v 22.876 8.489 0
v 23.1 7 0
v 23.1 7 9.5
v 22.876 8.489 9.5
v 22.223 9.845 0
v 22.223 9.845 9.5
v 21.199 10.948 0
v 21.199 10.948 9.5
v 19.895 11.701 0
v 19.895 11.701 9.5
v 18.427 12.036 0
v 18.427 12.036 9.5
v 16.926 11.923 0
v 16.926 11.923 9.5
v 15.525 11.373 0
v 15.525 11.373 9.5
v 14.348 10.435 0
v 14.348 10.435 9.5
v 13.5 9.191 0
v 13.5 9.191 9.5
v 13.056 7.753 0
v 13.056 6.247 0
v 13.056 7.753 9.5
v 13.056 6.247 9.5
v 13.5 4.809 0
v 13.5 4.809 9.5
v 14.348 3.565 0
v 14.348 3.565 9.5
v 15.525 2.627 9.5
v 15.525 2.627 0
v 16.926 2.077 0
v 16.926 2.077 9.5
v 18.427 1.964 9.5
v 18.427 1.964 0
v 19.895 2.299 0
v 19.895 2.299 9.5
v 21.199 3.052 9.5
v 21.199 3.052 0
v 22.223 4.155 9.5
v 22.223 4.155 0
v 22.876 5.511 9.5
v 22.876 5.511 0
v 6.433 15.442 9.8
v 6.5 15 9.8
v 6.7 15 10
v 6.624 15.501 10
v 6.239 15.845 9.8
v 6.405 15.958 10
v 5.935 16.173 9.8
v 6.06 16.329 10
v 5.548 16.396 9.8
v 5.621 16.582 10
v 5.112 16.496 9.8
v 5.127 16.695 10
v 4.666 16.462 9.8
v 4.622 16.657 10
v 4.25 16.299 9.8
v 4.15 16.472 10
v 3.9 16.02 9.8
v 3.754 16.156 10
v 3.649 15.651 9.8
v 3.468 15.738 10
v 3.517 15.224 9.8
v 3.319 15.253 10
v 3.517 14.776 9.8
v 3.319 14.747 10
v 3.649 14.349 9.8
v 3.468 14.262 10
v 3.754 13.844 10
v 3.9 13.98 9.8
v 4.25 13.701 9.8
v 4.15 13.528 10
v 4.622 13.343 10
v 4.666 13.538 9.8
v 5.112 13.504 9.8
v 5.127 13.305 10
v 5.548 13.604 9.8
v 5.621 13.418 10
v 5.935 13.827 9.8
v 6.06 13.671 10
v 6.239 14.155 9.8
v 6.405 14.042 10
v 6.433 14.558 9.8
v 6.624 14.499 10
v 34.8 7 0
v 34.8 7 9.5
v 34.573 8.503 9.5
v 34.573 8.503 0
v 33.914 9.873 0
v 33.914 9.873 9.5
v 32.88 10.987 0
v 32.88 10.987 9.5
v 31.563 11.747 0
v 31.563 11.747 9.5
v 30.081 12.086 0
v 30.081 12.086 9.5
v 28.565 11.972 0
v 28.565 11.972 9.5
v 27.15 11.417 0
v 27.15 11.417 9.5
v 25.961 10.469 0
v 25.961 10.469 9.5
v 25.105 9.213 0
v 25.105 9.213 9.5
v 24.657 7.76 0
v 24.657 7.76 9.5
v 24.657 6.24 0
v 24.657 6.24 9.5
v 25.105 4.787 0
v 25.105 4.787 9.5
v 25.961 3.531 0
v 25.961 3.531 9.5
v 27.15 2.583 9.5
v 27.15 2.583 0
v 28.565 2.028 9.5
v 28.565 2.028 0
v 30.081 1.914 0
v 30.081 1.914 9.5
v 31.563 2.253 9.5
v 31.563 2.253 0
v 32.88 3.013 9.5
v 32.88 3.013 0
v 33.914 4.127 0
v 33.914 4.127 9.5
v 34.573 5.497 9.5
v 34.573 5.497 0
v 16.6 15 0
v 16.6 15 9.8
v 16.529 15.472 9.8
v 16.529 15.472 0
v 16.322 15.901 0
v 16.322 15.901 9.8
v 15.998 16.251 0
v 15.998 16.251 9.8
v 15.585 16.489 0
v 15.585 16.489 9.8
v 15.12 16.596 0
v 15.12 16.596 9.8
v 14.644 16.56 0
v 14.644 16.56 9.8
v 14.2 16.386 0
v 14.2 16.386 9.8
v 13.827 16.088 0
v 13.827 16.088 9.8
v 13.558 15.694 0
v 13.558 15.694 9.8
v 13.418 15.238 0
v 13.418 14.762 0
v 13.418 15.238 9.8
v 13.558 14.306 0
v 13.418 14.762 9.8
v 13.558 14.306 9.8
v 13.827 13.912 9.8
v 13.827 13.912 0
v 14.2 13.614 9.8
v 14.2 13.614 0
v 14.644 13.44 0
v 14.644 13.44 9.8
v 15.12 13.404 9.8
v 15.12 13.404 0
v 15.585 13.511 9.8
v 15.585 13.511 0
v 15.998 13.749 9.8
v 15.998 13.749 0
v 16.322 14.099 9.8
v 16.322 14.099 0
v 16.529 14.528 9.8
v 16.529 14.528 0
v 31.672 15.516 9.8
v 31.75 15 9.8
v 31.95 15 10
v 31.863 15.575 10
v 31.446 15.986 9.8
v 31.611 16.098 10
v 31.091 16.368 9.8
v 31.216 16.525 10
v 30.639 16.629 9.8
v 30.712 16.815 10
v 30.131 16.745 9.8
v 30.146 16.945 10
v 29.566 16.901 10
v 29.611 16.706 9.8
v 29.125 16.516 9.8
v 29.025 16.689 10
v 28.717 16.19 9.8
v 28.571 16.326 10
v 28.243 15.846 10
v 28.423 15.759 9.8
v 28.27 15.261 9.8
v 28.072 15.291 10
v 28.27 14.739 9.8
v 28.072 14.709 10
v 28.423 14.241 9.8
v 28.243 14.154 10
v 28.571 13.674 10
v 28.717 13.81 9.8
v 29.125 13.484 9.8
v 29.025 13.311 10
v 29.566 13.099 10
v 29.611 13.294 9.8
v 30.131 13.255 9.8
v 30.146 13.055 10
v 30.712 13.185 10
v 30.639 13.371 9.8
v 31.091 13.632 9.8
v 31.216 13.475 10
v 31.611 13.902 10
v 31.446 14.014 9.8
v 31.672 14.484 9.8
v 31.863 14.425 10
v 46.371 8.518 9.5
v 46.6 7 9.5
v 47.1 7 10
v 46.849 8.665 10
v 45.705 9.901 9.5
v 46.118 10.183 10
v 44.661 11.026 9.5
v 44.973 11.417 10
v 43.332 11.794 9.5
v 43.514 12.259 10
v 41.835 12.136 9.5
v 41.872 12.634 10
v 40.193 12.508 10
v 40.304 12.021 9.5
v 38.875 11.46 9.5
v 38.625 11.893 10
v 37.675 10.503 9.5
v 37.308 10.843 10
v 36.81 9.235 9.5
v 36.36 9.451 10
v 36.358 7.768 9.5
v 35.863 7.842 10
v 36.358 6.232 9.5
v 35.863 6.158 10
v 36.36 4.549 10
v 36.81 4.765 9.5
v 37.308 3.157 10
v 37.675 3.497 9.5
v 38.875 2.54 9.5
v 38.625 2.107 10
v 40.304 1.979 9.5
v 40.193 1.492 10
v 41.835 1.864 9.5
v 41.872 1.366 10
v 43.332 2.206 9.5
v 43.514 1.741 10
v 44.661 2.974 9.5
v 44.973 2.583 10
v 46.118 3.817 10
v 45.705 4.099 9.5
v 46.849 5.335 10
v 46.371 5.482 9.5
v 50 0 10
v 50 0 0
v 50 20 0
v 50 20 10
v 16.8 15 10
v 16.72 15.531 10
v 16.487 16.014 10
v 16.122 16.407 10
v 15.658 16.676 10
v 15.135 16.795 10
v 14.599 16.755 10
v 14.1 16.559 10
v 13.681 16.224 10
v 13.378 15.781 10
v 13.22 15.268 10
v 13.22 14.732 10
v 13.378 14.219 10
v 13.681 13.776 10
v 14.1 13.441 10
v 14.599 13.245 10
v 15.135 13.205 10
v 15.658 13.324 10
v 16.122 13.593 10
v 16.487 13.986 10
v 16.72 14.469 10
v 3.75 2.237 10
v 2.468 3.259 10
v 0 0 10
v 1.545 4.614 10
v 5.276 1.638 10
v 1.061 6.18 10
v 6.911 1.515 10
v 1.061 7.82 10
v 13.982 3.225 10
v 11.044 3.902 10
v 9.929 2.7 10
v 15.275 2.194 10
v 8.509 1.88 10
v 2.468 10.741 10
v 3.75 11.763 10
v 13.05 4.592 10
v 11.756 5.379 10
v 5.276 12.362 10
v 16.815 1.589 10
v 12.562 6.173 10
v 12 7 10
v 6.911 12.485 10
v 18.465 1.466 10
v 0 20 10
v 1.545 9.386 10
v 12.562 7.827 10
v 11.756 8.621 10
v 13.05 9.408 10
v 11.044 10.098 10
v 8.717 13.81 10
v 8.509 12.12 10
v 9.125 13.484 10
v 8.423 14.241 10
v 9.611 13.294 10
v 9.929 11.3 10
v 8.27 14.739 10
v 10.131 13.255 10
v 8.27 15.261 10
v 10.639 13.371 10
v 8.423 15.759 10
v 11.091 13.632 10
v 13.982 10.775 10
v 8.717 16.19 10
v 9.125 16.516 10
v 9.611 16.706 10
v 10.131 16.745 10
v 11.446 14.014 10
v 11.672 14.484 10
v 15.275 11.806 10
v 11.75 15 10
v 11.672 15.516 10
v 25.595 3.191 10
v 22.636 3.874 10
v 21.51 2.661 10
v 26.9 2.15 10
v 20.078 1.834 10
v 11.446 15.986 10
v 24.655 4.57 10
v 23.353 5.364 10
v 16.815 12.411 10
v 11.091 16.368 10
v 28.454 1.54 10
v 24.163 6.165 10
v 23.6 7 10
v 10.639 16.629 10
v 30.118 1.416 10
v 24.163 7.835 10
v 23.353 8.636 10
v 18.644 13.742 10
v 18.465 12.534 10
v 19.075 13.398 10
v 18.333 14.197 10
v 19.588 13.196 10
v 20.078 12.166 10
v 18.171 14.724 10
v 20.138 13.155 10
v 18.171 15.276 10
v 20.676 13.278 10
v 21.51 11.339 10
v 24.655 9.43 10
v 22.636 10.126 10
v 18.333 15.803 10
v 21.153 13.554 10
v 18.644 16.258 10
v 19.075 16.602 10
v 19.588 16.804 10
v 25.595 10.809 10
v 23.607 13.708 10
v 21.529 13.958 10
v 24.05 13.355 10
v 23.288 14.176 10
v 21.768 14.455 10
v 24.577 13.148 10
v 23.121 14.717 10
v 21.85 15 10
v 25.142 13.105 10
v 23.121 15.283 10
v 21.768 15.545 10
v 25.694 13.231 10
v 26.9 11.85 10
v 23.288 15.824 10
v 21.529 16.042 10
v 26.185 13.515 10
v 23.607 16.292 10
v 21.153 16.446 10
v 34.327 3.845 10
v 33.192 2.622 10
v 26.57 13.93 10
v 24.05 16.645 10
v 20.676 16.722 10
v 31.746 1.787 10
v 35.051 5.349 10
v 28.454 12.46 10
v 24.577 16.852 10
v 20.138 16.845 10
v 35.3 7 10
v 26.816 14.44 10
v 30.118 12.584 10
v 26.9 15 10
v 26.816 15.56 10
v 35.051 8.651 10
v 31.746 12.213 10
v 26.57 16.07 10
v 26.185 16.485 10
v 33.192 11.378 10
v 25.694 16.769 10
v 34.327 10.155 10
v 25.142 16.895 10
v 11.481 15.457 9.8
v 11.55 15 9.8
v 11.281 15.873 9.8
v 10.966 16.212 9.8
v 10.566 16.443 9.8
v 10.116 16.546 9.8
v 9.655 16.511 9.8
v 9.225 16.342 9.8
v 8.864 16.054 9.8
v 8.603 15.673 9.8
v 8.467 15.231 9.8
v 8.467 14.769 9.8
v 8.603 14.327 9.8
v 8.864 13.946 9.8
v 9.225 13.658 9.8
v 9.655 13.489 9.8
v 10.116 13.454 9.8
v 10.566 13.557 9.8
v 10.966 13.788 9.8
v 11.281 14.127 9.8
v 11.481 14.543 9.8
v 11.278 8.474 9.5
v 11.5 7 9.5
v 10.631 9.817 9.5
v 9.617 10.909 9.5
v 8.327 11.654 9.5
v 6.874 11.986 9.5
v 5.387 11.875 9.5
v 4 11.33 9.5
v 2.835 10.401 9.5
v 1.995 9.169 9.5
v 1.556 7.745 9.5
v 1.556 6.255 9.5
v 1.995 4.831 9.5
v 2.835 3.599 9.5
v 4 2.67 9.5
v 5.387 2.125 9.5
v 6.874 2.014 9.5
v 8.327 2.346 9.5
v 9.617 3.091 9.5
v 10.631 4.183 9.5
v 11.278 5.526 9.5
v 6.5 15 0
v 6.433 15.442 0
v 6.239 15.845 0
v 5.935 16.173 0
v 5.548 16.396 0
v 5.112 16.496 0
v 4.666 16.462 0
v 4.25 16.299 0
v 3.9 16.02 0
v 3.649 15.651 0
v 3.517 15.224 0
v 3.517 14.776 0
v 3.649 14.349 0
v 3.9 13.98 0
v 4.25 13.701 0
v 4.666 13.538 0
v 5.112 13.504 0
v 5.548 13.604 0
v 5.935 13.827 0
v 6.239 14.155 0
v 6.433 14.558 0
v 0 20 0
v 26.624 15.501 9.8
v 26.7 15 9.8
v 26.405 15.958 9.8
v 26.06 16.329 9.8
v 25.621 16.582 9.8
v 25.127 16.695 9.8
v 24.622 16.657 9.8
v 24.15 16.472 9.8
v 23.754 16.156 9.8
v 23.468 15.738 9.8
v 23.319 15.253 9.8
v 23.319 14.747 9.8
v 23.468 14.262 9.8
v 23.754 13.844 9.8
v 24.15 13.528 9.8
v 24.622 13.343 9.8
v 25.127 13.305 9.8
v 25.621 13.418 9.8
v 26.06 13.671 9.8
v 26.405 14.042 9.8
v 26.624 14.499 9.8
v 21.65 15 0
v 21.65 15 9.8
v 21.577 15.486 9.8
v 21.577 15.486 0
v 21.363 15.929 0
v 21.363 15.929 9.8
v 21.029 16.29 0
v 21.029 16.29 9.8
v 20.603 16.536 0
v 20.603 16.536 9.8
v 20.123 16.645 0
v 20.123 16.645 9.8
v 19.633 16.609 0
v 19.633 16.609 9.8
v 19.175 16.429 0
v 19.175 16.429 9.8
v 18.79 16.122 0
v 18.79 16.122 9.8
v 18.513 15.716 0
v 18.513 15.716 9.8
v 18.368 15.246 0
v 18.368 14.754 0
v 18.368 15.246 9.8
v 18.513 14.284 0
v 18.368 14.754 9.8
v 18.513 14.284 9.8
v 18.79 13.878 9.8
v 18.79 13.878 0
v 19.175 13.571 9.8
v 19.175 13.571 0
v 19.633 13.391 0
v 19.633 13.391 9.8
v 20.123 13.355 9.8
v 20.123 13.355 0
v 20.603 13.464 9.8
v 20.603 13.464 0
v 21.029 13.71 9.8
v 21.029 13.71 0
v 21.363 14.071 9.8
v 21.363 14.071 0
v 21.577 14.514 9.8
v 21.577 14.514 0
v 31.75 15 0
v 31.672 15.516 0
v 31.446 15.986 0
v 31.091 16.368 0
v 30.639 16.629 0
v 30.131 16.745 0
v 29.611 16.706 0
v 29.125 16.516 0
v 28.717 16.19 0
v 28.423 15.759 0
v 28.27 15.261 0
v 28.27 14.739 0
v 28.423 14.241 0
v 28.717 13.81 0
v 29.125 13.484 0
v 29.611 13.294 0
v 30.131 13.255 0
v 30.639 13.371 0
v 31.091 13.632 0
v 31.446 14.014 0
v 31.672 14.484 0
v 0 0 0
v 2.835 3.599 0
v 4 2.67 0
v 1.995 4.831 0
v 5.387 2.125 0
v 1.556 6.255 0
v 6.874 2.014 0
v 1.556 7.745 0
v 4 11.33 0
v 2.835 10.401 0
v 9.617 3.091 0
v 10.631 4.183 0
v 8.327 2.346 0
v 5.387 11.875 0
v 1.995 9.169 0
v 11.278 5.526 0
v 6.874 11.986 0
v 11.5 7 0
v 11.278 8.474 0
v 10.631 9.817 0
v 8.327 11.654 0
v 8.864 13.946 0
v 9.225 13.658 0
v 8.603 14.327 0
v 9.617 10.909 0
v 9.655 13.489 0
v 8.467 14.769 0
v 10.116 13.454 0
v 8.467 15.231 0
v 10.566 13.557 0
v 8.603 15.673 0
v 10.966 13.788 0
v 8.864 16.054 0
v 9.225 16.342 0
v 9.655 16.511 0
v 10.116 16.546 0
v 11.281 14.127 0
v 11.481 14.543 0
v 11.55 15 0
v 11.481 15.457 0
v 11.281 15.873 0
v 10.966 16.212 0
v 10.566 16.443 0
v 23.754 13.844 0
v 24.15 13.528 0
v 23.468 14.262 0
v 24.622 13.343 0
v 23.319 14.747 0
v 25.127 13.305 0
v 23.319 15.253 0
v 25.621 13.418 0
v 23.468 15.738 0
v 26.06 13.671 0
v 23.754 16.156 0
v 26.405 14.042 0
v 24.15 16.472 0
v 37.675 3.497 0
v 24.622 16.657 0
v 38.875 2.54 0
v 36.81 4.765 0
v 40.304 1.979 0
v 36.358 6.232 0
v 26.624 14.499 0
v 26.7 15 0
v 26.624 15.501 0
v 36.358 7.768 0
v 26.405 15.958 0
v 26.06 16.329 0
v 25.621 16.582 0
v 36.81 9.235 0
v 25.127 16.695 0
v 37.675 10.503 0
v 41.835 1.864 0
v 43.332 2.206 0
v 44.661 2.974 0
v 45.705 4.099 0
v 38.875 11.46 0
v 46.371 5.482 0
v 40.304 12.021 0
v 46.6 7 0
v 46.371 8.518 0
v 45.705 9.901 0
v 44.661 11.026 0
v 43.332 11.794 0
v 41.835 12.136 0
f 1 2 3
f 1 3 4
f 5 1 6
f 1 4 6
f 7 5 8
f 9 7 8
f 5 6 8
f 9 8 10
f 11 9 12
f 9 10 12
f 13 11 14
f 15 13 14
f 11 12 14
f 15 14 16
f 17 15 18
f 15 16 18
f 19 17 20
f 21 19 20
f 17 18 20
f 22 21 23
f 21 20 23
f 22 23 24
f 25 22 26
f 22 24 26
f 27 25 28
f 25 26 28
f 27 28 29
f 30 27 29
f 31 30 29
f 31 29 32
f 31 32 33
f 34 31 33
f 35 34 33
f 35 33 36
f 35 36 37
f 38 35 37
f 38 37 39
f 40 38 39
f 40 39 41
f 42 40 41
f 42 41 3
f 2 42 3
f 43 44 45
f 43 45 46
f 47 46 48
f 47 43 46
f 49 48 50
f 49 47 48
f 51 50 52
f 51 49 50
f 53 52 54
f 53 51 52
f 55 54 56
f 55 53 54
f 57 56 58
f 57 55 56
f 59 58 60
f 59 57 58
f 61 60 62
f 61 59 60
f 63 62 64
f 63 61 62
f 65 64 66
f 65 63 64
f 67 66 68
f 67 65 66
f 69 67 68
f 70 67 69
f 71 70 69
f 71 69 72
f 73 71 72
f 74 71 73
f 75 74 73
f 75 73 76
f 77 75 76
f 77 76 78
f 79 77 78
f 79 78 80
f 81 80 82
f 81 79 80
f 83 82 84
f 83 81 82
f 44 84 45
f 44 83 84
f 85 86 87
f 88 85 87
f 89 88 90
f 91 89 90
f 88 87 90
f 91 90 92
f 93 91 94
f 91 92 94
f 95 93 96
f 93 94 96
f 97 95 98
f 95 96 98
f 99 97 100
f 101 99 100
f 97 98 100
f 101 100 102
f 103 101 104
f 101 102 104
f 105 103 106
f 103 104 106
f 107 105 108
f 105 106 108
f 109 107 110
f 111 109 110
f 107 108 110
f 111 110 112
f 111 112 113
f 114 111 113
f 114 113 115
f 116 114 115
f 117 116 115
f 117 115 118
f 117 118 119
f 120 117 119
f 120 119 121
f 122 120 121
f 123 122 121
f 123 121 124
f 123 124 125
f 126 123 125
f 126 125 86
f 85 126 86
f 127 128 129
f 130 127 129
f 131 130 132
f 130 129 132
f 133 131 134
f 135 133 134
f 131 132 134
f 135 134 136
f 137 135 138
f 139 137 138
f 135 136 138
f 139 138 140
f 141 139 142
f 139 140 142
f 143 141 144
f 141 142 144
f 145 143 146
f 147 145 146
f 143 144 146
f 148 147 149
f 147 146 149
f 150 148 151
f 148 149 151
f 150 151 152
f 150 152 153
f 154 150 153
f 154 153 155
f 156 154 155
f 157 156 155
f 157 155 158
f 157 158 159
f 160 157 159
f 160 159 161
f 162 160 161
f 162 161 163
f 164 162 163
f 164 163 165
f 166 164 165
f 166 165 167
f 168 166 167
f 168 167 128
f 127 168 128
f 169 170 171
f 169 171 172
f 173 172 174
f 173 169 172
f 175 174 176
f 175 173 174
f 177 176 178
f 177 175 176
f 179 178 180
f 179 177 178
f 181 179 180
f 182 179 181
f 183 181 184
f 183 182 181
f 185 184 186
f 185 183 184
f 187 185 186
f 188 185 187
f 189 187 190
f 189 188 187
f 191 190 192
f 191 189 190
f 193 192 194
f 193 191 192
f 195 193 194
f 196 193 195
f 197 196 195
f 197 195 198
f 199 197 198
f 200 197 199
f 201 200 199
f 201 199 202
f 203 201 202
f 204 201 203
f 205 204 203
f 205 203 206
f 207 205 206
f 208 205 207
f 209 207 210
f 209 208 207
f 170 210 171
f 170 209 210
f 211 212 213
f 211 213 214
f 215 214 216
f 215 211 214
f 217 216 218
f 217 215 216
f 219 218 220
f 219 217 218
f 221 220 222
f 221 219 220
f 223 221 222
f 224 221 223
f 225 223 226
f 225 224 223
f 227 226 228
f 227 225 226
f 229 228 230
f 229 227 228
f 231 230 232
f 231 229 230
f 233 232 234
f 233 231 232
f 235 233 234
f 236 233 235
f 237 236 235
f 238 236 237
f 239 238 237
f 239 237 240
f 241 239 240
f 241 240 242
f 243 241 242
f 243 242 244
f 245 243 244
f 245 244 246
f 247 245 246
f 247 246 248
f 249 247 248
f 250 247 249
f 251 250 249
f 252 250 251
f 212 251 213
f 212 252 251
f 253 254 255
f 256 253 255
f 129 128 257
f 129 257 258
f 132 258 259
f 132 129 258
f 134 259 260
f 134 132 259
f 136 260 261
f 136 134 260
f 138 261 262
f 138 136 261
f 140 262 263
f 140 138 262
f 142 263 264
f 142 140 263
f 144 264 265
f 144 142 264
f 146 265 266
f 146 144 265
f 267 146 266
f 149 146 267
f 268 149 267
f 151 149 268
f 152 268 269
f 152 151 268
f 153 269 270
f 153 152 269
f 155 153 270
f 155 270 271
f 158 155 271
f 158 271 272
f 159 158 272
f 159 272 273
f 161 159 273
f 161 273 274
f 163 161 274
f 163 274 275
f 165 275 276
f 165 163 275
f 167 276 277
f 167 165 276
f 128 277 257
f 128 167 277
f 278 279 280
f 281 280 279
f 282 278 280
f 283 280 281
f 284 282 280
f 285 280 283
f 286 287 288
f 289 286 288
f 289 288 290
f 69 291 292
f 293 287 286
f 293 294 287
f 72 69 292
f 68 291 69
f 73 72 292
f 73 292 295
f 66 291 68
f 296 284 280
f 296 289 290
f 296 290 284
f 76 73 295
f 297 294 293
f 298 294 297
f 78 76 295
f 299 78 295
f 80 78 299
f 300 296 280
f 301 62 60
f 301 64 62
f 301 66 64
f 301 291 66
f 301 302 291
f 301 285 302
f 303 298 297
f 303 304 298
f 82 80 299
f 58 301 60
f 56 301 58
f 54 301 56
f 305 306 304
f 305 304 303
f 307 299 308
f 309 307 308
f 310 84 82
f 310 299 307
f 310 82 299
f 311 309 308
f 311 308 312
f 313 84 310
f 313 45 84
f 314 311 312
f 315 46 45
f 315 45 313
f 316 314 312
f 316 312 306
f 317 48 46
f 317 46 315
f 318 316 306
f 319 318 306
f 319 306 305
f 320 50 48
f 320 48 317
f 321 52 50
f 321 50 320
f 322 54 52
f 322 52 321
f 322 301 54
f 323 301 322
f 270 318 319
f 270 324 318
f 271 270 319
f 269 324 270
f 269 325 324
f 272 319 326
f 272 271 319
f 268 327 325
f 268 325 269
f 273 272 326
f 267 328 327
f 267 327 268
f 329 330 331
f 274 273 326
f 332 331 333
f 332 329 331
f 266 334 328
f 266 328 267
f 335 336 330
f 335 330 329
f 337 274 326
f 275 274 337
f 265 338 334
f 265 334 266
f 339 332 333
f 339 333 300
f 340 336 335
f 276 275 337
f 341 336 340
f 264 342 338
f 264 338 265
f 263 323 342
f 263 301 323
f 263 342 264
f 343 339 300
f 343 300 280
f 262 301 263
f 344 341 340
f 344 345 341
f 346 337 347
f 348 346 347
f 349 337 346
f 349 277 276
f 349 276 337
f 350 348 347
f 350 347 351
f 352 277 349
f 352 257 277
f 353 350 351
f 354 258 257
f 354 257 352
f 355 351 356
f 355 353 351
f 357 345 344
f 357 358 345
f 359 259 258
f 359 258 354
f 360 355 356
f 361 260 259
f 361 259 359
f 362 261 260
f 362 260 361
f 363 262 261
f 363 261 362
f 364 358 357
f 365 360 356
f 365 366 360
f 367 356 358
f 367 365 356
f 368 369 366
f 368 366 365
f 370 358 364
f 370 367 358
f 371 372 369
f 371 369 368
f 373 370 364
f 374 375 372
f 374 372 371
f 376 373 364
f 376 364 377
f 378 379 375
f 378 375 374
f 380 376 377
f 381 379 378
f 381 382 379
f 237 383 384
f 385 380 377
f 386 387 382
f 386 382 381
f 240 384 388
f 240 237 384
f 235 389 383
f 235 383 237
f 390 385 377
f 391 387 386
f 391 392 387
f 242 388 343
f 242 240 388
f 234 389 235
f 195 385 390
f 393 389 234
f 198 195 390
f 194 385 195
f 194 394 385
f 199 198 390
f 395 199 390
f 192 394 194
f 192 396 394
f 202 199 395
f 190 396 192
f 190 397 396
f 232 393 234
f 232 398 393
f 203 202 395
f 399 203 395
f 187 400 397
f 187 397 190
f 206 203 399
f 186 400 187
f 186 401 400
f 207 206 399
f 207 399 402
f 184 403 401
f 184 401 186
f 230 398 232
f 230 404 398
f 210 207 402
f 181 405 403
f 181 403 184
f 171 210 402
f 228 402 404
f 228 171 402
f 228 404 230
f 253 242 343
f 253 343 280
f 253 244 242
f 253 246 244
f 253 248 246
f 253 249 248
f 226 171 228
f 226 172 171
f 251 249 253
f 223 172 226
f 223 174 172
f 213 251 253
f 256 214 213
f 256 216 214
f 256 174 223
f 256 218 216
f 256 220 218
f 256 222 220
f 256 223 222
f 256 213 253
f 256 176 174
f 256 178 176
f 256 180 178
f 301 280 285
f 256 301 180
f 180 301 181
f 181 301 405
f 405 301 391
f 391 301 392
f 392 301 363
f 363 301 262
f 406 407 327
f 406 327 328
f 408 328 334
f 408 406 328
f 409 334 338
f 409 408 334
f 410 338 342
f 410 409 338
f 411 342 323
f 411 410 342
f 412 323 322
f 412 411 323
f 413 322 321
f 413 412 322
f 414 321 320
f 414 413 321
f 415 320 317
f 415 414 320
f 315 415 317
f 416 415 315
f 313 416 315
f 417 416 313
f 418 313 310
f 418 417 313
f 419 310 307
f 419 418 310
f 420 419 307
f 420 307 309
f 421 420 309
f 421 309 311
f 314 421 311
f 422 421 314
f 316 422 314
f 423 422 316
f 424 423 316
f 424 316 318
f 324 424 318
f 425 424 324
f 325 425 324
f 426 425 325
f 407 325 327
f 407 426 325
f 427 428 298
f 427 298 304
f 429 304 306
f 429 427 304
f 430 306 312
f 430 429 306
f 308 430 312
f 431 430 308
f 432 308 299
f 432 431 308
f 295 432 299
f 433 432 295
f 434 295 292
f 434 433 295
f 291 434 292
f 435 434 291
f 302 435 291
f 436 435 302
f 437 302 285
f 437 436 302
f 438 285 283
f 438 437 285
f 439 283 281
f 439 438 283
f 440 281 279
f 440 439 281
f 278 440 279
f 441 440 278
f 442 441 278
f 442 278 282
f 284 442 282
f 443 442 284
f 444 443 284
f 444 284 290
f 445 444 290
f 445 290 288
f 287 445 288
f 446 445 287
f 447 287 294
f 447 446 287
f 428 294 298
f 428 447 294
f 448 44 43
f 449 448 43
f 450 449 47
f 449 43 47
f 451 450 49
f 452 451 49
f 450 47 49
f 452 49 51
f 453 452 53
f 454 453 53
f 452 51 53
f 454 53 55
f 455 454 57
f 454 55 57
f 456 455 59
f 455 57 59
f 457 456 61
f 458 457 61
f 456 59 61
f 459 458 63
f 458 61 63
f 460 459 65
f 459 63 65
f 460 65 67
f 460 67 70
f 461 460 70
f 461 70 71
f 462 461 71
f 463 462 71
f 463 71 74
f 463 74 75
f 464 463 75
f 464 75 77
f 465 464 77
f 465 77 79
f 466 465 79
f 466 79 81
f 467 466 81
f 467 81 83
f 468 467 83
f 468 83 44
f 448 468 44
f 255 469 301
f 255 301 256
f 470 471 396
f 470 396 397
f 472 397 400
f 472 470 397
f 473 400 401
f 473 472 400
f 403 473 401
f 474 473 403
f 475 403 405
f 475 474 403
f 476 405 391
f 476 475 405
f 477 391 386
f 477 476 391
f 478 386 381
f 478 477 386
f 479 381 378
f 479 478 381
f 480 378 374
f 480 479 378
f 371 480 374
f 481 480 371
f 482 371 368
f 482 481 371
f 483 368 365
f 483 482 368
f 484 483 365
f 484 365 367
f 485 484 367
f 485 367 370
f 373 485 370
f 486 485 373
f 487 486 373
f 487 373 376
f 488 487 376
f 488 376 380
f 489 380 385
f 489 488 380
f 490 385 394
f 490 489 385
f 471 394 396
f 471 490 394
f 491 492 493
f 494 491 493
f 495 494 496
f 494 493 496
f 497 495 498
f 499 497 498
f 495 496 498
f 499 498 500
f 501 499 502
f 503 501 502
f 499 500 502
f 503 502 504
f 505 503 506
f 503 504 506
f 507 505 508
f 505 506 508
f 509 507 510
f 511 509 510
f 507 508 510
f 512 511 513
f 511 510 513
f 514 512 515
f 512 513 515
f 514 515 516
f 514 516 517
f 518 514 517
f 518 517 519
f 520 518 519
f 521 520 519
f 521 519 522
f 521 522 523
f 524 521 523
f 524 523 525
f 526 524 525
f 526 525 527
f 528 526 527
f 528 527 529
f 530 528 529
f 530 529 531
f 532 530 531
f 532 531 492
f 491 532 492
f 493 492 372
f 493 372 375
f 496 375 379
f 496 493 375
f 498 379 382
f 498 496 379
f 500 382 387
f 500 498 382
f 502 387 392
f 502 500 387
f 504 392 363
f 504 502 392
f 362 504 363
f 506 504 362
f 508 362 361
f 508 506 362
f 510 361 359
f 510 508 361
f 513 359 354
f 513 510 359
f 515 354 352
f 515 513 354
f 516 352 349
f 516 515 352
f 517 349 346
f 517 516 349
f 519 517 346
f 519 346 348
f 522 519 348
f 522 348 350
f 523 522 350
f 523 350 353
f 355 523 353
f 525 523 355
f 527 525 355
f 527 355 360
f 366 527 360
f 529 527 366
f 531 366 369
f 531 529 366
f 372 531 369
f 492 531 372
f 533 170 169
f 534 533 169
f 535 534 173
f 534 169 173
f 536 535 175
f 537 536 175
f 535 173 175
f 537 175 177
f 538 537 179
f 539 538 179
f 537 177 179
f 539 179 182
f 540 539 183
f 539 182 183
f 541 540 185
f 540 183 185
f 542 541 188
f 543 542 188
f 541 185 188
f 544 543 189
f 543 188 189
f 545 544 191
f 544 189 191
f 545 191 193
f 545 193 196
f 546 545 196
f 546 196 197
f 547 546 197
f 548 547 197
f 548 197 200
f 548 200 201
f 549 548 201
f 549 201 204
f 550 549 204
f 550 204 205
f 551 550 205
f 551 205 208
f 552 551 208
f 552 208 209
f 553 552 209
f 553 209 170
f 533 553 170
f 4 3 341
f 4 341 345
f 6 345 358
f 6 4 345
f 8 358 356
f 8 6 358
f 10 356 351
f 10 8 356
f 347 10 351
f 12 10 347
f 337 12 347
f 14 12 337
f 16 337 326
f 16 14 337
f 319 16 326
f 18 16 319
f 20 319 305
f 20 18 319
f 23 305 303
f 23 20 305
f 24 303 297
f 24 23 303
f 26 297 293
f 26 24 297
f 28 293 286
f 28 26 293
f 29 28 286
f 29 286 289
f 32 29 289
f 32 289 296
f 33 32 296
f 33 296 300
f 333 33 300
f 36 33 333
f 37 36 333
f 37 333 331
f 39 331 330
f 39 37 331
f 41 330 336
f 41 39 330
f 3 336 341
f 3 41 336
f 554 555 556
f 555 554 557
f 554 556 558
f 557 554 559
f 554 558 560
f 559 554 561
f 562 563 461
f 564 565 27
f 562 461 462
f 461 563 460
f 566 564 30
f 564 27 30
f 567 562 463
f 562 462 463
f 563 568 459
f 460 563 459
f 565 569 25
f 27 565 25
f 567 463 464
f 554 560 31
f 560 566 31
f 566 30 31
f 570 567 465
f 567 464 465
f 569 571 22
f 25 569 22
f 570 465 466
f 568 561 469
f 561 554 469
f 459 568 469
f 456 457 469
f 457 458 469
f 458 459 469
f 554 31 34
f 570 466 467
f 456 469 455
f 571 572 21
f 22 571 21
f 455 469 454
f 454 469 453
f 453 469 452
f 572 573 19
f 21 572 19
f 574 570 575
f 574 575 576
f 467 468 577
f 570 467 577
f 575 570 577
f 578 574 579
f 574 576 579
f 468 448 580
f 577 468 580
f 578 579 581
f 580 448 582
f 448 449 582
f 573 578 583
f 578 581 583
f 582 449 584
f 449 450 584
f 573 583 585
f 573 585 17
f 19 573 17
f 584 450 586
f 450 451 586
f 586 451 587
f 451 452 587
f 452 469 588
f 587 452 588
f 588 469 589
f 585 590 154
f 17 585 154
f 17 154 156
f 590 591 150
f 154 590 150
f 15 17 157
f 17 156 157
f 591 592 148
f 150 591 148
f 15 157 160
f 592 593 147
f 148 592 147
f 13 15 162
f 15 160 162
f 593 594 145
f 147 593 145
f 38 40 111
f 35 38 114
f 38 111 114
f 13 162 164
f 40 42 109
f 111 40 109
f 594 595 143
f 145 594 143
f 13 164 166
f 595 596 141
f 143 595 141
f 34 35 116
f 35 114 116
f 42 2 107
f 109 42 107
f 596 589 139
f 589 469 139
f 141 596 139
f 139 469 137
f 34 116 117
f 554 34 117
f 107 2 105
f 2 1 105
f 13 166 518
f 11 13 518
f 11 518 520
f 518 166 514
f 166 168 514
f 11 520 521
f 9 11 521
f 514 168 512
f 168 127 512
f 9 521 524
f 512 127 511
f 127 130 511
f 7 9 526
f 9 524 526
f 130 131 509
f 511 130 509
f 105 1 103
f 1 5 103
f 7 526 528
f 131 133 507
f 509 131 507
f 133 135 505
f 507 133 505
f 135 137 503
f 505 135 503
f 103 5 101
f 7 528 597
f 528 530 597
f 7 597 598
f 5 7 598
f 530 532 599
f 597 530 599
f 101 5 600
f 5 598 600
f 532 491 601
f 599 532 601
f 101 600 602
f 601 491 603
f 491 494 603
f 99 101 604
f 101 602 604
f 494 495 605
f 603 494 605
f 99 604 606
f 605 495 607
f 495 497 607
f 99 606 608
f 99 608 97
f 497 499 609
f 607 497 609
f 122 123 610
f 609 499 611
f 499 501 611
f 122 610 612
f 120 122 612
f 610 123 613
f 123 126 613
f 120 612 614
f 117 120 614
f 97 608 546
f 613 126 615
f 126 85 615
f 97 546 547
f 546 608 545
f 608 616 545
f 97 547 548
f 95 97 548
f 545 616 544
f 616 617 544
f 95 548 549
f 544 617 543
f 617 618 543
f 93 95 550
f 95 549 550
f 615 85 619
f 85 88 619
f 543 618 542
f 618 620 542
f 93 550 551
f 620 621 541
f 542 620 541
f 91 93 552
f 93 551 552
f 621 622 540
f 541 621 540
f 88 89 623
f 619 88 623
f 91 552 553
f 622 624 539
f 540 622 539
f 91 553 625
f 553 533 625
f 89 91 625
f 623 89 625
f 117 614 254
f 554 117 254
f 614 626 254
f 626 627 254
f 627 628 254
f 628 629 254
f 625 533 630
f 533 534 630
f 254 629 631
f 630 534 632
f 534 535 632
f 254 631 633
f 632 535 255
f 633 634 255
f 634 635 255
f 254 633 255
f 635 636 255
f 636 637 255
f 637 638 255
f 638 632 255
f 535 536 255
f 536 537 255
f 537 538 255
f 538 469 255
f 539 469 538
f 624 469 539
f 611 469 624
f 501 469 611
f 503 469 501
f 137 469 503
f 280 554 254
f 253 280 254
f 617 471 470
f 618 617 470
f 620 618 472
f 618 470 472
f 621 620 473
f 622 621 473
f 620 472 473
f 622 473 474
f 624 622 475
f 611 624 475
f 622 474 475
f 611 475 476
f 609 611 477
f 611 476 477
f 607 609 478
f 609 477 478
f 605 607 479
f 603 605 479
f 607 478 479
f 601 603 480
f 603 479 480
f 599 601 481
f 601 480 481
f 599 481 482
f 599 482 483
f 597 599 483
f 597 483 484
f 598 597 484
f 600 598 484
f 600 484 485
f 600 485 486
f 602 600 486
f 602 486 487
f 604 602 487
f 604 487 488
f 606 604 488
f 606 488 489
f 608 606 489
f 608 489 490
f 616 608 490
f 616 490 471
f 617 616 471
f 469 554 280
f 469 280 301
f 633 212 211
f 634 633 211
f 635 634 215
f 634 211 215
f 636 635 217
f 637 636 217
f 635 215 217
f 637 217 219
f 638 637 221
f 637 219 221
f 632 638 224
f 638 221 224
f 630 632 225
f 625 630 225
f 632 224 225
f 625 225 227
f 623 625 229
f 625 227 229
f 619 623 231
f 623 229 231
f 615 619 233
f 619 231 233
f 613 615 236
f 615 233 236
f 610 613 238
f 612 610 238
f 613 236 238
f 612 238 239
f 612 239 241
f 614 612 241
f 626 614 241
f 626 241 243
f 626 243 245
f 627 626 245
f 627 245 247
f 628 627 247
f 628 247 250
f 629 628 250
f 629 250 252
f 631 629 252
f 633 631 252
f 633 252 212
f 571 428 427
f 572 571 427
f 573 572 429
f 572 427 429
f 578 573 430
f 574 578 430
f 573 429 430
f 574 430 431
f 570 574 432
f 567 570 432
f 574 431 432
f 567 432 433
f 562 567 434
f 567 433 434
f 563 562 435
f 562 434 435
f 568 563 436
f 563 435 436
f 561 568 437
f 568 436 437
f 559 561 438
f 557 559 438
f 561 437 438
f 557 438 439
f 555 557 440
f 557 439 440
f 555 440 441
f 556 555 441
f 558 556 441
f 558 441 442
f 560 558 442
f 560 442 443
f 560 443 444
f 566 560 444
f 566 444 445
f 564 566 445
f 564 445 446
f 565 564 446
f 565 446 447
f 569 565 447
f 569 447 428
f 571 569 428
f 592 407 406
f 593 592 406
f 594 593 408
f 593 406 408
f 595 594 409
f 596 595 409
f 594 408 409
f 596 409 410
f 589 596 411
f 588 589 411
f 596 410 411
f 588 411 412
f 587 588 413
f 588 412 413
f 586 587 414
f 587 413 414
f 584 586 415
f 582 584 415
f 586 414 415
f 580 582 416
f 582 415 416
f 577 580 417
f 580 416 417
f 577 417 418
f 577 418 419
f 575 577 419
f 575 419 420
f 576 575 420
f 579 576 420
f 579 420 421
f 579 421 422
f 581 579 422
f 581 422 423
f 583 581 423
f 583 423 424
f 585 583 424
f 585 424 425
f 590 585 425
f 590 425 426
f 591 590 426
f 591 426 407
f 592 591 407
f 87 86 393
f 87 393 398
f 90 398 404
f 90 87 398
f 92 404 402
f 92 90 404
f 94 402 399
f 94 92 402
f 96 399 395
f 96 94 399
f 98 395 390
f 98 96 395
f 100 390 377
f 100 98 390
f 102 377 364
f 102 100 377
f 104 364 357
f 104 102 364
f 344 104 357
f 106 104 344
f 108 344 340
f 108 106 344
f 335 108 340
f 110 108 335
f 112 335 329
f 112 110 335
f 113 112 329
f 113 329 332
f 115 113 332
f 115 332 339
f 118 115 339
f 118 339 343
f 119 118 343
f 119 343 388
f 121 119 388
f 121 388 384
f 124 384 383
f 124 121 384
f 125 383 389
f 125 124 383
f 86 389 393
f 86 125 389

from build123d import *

# Parameters (mm, degrees)
SKETCH_W        = 50
SKETCH_H        = 20
PAD_DEPTH       = 10
SKETCH001_R     = 1.5
SKETCH001_R_2   = 1.55
SKETCH001_R_3   = 1.6
SKETCH001_R_4   = 1.7
SKETCH001_R_5   = 1.75
SKETCH001_R_6   = 1.65
SKETCH001_R_7   = 5
SKETCH001_R_8   = 5.05
SKETCH001_R_9   = 5.1
SKETCH001_R_10  = 5.15
POCKET_DEPTH    = 10.001
CHAMFER_SIZE    = 0.5
CHAMFER001_SIZE = 0.5
CHAMFER002_SIZE = 0.5
CHAMFER003_SIZE = 0.2


with BuildPart() as part:
    # Sketch → Pad (new body)
    with BuildSketch(Plane.XY):
        with Locations((25, 10)):
            Rectangle(SKETCH_W, SKETCH_H)
    extrude(amount=PAD_DEPTH)

    # Sketch001 (on Face6 of Pad) → Pocket (cut, through all)
    with BuildSketch(Plane.XY.offset(10)):
        with Locations((5, 15)):
            Circle(SKETCH001_R)
        with Locations((10, 15)):
            Circle(SKETCH001_R_2)
        with Locations((15, 15)):
            Circle(SKETCH001_R_3)
        with Locations((25, 15)):
            Circle(SKETCH001_R_4)
        with Locations((30, 15)):
            Circle(SKETCH001_R_5)
        with Locations((20, 15)):
            Circle(SKETCH001_R_6)
        with Locations((6.5, 7)):
            Circle(SKETCH001_R_7)
        with Locations((18.05, 7)):
            Circle(SKETCH001_R_8)
        with Locations((29.7, 7)):
            Circle(SKETCH001_R_9)
        with Locations((41.45, 7)):
            Circle(SKETCH001_R_10)
    extrude(amount=-POCKET_DEPTH, mode=Mode.SUBTRACT)

    # Chamfer
    chamfer_edges = [part.edges().sort_by_distance(p)[0] for p in [
        (1.5, 7, 10),
    ]]
    chamfer(chamfer_edges, length=CHAMFER_SIZE)

    # Chamfer001
    chamfer001_edges = [part.edges().sort_by_distance(p)[0] for p in [
        (13, 7, 10),
        (24.6, 7, 10),
    ]]
    chamfer(chamfer001_edges, length=CHAMFER001_SIZE)

    # Chamfer002
    chamfer002_edges = [part.edges().sort_by_distance(p)[0] for p in [
        (36.3, 7, 10),
    ]]
    chamfer(chamfer002_edges, length=CHAMFER002_SIZE)

    # Chamfer003
    chamfer003_edges = [part.edges().sort_by_distance(p)[0] for p in [
        (3.5, 15, 10),
        (8.45, 15, 10),
        (13.4, 15, 10),
        (18.35, 15, 10),
        (23.3, 15, 10),
        (28.25, 15, 10),
    ]]
    chamfer(chamfer003_edges, length=CHAMFER003_SIZE)


solid = part.part
